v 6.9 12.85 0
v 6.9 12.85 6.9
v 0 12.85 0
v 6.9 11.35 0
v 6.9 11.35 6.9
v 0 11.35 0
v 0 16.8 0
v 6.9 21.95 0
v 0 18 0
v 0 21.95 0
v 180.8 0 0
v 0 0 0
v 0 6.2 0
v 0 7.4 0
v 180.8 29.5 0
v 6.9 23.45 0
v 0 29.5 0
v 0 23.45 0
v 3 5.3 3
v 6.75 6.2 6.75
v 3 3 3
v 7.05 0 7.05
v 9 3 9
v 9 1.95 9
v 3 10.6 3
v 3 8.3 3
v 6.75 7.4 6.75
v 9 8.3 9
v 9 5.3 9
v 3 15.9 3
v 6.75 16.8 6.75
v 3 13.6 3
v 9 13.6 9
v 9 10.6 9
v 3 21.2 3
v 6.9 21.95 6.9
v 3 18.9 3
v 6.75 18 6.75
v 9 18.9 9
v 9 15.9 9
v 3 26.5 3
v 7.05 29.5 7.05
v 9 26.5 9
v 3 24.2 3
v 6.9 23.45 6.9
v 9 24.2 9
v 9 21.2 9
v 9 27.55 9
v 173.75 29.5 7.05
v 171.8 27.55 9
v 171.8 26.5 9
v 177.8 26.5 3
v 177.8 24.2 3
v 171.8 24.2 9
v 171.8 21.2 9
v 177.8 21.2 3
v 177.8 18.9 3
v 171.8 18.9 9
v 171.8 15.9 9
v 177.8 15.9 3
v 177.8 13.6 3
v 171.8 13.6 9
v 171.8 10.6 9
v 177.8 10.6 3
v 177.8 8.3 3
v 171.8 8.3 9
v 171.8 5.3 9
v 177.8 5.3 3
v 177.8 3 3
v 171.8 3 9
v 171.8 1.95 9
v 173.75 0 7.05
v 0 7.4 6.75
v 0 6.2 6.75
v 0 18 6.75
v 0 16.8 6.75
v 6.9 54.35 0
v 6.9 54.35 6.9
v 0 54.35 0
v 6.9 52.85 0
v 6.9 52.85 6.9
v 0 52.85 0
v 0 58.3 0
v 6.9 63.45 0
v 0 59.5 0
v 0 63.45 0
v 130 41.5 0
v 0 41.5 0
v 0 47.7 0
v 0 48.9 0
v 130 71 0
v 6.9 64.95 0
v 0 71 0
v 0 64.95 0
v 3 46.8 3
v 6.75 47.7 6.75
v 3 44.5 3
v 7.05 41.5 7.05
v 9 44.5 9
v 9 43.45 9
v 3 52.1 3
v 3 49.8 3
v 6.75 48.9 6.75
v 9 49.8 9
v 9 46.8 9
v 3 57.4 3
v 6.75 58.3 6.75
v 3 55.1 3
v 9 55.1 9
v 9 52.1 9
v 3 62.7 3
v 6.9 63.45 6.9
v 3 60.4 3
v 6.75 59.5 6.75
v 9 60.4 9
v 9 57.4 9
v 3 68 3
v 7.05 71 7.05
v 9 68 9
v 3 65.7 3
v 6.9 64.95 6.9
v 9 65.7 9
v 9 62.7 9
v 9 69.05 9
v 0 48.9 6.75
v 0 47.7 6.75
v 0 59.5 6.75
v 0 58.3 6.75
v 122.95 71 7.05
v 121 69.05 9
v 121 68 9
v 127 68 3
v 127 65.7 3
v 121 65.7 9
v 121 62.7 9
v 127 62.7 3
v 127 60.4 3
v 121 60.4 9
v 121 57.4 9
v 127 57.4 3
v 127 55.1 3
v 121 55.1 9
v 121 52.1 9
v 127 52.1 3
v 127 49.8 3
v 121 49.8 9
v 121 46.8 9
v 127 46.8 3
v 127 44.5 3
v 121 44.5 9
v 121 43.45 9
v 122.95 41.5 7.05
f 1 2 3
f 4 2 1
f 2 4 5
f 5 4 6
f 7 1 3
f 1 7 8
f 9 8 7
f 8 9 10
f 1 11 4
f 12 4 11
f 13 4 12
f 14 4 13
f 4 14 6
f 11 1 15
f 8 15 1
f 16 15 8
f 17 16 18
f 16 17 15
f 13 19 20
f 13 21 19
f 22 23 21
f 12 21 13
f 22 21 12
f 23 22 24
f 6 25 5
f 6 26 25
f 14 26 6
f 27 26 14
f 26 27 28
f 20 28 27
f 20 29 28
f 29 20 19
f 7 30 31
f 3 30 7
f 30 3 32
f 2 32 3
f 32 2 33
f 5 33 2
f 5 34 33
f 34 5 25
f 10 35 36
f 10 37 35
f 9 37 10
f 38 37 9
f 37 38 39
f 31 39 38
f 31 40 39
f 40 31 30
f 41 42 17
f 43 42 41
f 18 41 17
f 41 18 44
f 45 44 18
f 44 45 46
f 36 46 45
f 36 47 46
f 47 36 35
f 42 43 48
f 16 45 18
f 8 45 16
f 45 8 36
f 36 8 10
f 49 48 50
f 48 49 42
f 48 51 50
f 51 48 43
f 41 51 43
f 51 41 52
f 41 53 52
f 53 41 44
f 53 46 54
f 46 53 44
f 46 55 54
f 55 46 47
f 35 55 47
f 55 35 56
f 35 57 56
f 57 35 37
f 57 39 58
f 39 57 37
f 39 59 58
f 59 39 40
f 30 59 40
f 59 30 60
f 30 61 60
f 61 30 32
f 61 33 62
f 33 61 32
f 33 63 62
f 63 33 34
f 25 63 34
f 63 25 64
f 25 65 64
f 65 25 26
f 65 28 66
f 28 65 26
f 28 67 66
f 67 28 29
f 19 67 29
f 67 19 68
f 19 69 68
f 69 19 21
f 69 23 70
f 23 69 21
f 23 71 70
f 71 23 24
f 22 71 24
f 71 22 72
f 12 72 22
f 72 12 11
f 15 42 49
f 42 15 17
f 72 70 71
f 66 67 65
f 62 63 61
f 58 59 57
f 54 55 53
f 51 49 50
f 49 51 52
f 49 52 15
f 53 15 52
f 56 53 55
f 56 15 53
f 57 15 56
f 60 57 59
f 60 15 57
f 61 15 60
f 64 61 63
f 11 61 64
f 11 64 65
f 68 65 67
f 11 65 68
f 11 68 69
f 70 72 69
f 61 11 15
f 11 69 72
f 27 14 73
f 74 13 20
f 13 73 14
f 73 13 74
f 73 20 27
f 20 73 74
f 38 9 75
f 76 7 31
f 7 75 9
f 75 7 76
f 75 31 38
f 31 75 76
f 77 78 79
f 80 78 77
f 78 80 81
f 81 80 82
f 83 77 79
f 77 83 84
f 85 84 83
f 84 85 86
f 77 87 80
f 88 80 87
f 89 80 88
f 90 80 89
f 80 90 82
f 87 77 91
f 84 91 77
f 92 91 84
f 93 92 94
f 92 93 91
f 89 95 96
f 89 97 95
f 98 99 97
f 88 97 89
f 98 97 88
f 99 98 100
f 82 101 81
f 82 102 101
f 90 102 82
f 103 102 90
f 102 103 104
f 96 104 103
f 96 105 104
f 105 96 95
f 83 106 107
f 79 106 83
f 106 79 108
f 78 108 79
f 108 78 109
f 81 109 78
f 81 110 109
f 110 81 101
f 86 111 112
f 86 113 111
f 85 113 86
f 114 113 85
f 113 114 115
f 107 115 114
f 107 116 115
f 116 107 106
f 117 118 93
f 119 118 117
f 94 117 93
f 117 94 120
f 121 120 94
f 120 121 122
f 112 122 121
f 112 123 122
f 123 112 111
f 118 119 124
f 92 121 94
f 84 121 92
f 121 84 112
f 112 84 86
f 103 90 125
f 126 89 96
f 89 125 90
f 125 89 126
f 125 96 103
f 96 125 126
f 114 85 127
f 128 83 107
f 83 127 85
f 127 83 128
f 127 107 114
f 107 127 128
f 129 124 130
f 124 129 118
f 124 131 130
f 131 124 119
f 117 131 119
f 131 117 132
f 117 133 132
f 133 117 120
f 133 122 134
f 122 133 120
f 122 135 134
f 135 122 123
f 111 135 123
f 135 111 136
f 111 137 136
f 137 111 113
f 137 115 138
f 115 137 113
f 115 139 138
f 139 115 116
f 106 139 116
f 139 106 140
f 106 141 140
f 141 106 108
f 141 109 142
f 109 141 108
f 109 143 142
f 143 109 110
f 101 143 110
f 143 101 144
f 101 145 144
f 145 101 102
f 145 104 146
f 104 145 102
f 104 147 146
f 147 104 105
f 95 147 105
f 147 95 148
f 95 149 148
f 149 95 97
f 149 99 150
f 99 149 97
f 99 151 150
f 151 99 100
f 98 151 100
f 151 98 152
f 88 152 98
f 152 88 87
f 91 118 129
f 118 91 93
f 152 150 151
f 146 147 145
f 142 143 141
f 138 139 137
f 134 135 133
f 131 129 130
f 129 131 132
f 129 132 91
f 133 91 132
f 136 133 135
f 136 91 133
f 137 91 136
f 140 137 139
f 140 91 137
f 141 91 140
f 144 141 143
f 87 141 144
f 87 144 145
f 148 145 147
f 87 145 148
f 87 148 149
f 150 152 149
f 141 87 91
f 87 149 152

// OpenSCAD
// Acrylic Panel Frame Builder
// Parametric 2-sided (L) or 4-sided multi-panel acrylic frame with
// 45° mitered ends and interior tongue/groove interlocks.
// Units: millimeters

/* [Frame Style] */
// 2 = L-shaped stand; 4 = closed picture frame
num_sides = 2; // [2, 4]
// Chamfer the long outer top edges of the profile
bevel_outer = true;
// assembled = visual check; printable = parts laid flat for export
layout = "printable"; // ["assembled", "printable"]
// Ghost acrylic panels in assembled view
show_panels = true;
// 2-sided free-end styles (non-joining ends):
//   mitered = 45° cut; open = square, slots through; closed = square with end wall
// Length rail = bottom / horizontal (along panel_length)
length_end_style = "mitered"; // ["mitered", "open", "closed"]
// Width rail = side / vertical (along panel_width)
width_end_style = "mitered"; // ["mitered", "open", "closed"]

/* [Panels] */
num_panels = 5;
// Acrylic edge along the bottom / horizontal rails (7" default)
panel_length = 177.8;
// Acrylic edge along the side / vertical rails (5" default)
panel_width = 127;
// Acrylic stock thickness
panel_thickness = 2;

/* [Slots & Frame Body] */
// How far the acrylic sits into each groove
slot_depth = 6;
// Extra clearance added to slot opening width
slot_tolerance = 0.3;
// Solid wall between neighboring panel slots
gap_between_panels = 3;
// Solid material under the slot floor
frame_under_slot = 3;
// Material outside the first and last slot
outer_wall = 3;
// Long-edge outer chamfer size when bevel_outer is true
bevel_size = 2;

/* [Corner Joint] */
// Clearance on interior tongues / grooves (per side, and on top)
joint_tolerance = 0.15;
// Fraction of the 45° face used by tongues/slots, measured from the base
interlock_face_fraction = 0.75;
// Tongue/groove thickness inside the wall (stack direction); 0 = auto
tab_thickness = 0;

/* [Print Layout] */
print_spacing = 12;

/* [Hidden] */
eps = 0.05;

// ---------------------------------------------------------------------------
// Derived
// ---------------------------------------------------------------------------
slot_opening = panel_thickness + slot_tolerance;
frame_height = slot_depth + frame_under_slot;
frame_width  = 2 * outer_wall
             + num_panels * slot_opening
             + max(0, num_panels - 1) * gap_between_panels;
wall_count   = num_panels + 1;
interior_wall_count = max(0, wall_count - 2);

// Thin tongue inside the wall — leaves wall material on both sides
tab_t_raw = tab_thickness > 0 ? tab_thickness : min(1.2, gap_between_panels / 2);
// Tongue/slot height along the miter (from the base); top of face left clear for tolerance.
// Cap so interlock_h + joint_tolerance never exceeds frame height.
interlock_h_max = frame_under_slot + slot_depth - joint_tolerance;
interlock_h = min(frame_height * interlock_face_fraction, interlock_h_max);

// Outer pad = material under the slot floor, so acrylic sits inset from
// the outside of the frame (not flush with the outer corner).
// 2-sided: pad only at the joining corner; free ends stay flush with the panel.
// 4-sided: pad on both ends of each rail.
outer_pad       = frame_under_slot;
rail_pad_count  = num_sides == 2 ? 1 : 2;
// Closed free ends add an outer_wall-thick cap beyond the panel
length_end_cap  = (num_sides == 2 && length_end_style == "closed") ? outer_wall : 0;
width_end_cap   = (num_sides == 2 && width_end_style  == "closed") ? outer_wall : 0;
bottom_rail_len = panel_length + rail_pad_count * outer_pad + length_end_cap;
side_rail_len   = panel_width  + rail_pad_count * outer_pad + width_end_cap;

length_end_mitered = (length_end_style == "mitered");
length_end_closed  = (length_end_style == "closed");
width_end_mitered  = (width_end_style  == "mitered");
width_end_closed   = (width_end_style  == "closed");

// Tongue/groove gender along the stack.
// Even # of interior walls (odd panel count): reversing the stack (flip when
// assembling from the print bed) swaps phase 0 ↔ phase 1. Mating parts must
// use the SAME phase so a flipped piece becomes complementary.
// Odd # of interior walls (even panel count): reverse preserves phase, so
// mating parts use opposite phases.
flip_mates = (interior_wall_count % 2 == 0);
function mate_phase(phase) = flip_mates ? phase : (1 - phase);

// ---------------------------------------------------------------------------
function wall_y(i) =
    (i == 0) ? 0
             : outer_wall + i * slot_opening + (i - 1) * gap_between_panels;

function wall_thickness(i) =
    (i == 0 || i == wall_count - 1) ? outer_wall : gap_between_panels;

function slot_y(i) =
    outer_wall + i * (slot_opening + gap_between_panels);

function interior_wall_id(k) = k + 1;

// Tongue thickness clamped so it fits inside a given wall
function tongue_t(i) =
    min(tab_t_raw, max(0.6, wall_thickness(i) - 1.0));

// Centered Y origin of the tongue/groove inside wall i
function tongue_y(i) =
    wall_y(i) + (wall_thickness(i) - tongue_t(i)) / 2;

// ---------------------------------------------------------------------------
// 2D profile: X = stack, Y = height (slots open +Y)
// ---------------------------------------------------------------------------
module frame_profile(bevel = false) {
    difference() {
        square([frame_width, frame_height]);

        for (i = [0 : num_panels - 1])
            translate([slot_y(i), frame_under_slot])
                square([slot_opening, slot_depth + eps]);

        if (bevel && bevel_size > 0) {
            polygon([
                [-eps, frame_height - bevel_size],
                [-eps, frame_height + eps],
                [bevel_size, frame_height + eps]
            ]);
            polygon([
                [frame_width + eps, frame_height - bevel_size],
                [frame_width - bevel_size, frame_height + eps],
                [frame_width + eps, frame_height + eps]
            ]);
        }
    }
}

// Rail along +X: X=length, Y=stack, Z=base→slots
module slotted_bar(length, bevel = false) {
    rotate([90, 0, 90])
        linear_extrude(height = length, convexity = 10)
            frame_profile(bevel);
}

// ---------------------------------------------------------------------------
// Clean 45° outside miter — whole profile, including all walls & base.
// Removes x < z at the start (base / outer corner is the long point).
// ---------------------------------------------------------------------------
module miter_waste_start() {
    translate([0, frame_width + eps, 0])
        rotate([90, 0, 0])
            linear_extrude(height = frame_width + 2 * eps, convexity = 4)
                polygon([
                    [-eps,               -eps],
                    [-eps,               frame_height + eps],
                    [frame_height + eps, frame_height + eps]
                ]);
}

module miter_waste_end(length) {
    translate([length, 0, 0])
        mirror([1, 0, 0])
            miter_waste_start();
}

// ---------------------------------------------------------------------------
// Triangular tongue / groove in the XZ plane (thin in Y).
//
// Male tongue = right triangle in the miter WASTE region (x <= z):
//   (0,0) — (0,fh) — (fh,fh). Hypotenuse lies on the 45° face; the tongue
//   merges with the base at the outer corner. Height == frame_height.
//
// Female groove = thin parallelogram pocket ALONG the 45° face, cut into
//   the solid (x >= z) by `deepen`. Opens on the miter face for the full
//   face length (base → tip) so the mate's triangular tongue can insert.
//   Previous vertical-rectangle cuts at the tip were wrong (invisible /
//   "blemishes" in print mode, oversized slots when assembled).
// ---------------------------------------------------------------------------
module tongue_triangle_2d() {
    // Waste-side triangle on the lower portion of the miter face only.
    // Hypotenuse lies on the 45° face from the base up to interlock_h.
    h = interlock_h;
    polygon([
        [0, 0],
        [0, h],
        [h, h]
    ]);
}

module groove_triangle_2d() {
    // Solid-side triangle matching the tongue, with joint_tolerance on the
    // sides and top. Bottom stays at z = 0 (no cut into the build-plate
    // base). Top tolerance uses the unused upper quarter of the miter face
    // so it does not run past the top of the rail.
    t = joint_tolerance;
    h = interlock_h;
    top = min(h + t, frame_height);
    polygon([
        [0,     0],
        [h + t, 0],
        [h + t, top]
    ]);
}

module thin_prism_xy(y, thickness) {
    // Extrude a 2D XZ profile (drawn in XY) into a thin prism along Y
    translate([0, y + thickness, 0])
        rotate([90, 0, 0])
            linear_extrude(height = thickness, convexity = 4)
                children();
}

module interior_tongues(at_start = true, length = 0, phase = 0) {
    if (interior_wall_count > 0)
        for (k = [0 : interior_wall_count - 1])
            if (k % 2 == phase) {
                i = interior_wall_id(k);
                y = tongue_y(i);
                t = tongue_t(i);
                if (at_start)
                    thin_prism_xy(y, t)
                        tongue_triangle_2d();
                else
                    translate([length, 0, 0])
                        mirror([1, 0, 0])
                            thin_prism_xy(y, t)
                                tongue_triangle_2d();
            }
}

module interior_grooves(at_start = true, length = 0, phase = 0) {
    if (interior_wall_count > 0)
        for (k = [0 : interior_wall_count - 1])
            if (k % 2 != phase) {
                i = interior_wall_id(k);
                // Lateral clearance: same joint_tolerance used on the top
                t = tongue_t(i) + 2 * joint_tolerance;
                y = wall_y(i) + (wall_thickness(i) - t) / 2;
                if (at_start)
                    thin_prism_xy(y, t)
                        groove_triangle_2d();
                else
                    translate([length, 0, 0])
                        mirror([1, 0, 0])
                            thin_prism_xy(y, t)
                                groove_triangle_2d();
            }
}

// Cap that closes panel slots at a square free end (thickness = outer_wall).
// Uses the same outer-edge bevel as the rail profile when requested.
module end_cap(length, bevel = false) {
    translate([length - outer_wall, 0, 0])
        rotate([90, 0, 90])
            linear_extrude(height = outer_wall, convexity = 4)
                difference() {
                    square([frame_width, frame_height]);
                    if (bevel && bevel_size > 0) {
                        polygon([
                            [-eps, frame_height - bevel_size],
                            [-eps, frame_height + eps],
                            [bevel_size, frame_height + eps]
                        ]);
                        polygon([
                            [frame_width + eps, frame_height - bevel_size],
                            [frame_width - bevel_size, frame_height + eps],
                            [frame_width + eps, frame_height + eps]
                        ]);
                    }
                }
}

// ---------------------------------------------------------------------------
// One rail
//   miter_*      : apply clean 45° end cut
//   interlock_*  : add interior tongue/groove (joining ends only)
//   closed_end   : square free end with outer_wall-thick slot cap
// ---------------------------------------------------------------------------
module frame_rail(
    length,
    miter_start = false,
    miter_end = false,
    interlock_start = false,
    interlock_end = false,
    phase_start = 0,
    phase_end = 0,
    bevel = false,
    closed_end = false
) {
    union() {
        difference() {
            slotted_bar(length, bevel);

            if (miter_start)
                miter_waste_start();
            if (miter_end)
                miter_waste_end(length);

            // Grooves cut after miter so they go through the angled face
            // and all the way down through the base.
            if (miter_start && interlock_start)
                interior_grooves(true, length, phase_start);
            if (miter_end && interlock_end)
                interior_grooves(false, length, phase_end);
        }

        // Tongues unioned after miter so they stay un-chamfered, full-height,
        // and merged with the base.
        if (miter_start && interlock_start)
            interior_tongues(true, length, phase_start);
        if (miter_end && interlock_end)
            interior_tongues(false, length, phase_end);

        // Closed free end: solid wall capping the slots
        if (closed_end)
            end_cap(length, bevel);
    }
}

module orient_rail_vertical() {
    multmatrix([
        [0, 0, 1, 0],
        [0, 1, 0, 0],
        [1, 0, 0, 0],
        [0, 0, 0, 1]
    ]) children();
}

// Reverse the panel-stack axis (as when flipping a printed part to stand it up).
module flip_stack() {
    translate([0, frame_width, 0])
        mirror([0, 1, 0])
            children();
}

module acrylic_panels() {
    // Inset by frame_under_slot so edges sit on the slot floors
    color([0.55, 0.8, 1.0, 0.35])
        for (i = [0 : num_panels - 1])
            translate([
                outer_pad,
                slot_y(i) + slot_tolerance / 2,
                outer_pad
            ])
                cube([panel_length, panel_thickness, panel_width]);
}

// ---------------------------------------------------------------------------
// 2-sided: joining end = miter + interlock; free ends per length/width style
// ---------------------------------------------------------------------------
module assembled_2() {
    side_phase = mate_phase(0);

    color("SteelBlue")
        frame_rail(
            bottom_rail_len,
            miter_start = true,
            miter_end = length_end_mitered,
            interlock_start = true,
            interlock_end = false,
            phase_start = 0,
            bevel = bevel_outer,
            closed_end = length_end_closed
        );

    color("CadetBlue")
        orient_rail_vertical()
            // When flip_mates, mirror stack to match flipping the printed side rail
            if (flip_mates)
                flip_stack()
                    frame_rail(
                        side_rail_len,
                        miter_start = true,
                        miter_end = width_end_mitered,
                        interlock_start = true,
                        interlock_end = false,
                        phase_start = side_phase,
                        bevel = bevel_outer,
                        closed_end = width_end_closed
                    );
            else
                frame_rail(
                    side_rail_len,
                    miter_start = true,
                    miter_end = width_end_mitered,
                    interlock_start = true,
                    interlock_end = false,
                    phase_start = side_phase,
                    bevel = bevel_outer,
                    closed_end = width_end_closed
                );

    if (show_panels)
        acrylic_panels();
}

module assembled_4() {
    // Length rails: mirrored ends (0 at start/left, 1 at end/right) so a
    // length can be flipped end-for-end and still match the width pair.
    // Width rails: same order on both ends — pairing combo:
    //   left  = phase 1 (mates length's phase-0 ends)
    //   right = phase 0 (mates length's phase-1 ends)
    Lh = bottom_rail_len;
    Lv = side_rail_len;

    // Bottom: start at left (phase 0), end at right (phase 1)
    color("SteelBlue")
        frame_rail(Lh, true, true, true, true, 0, 1, bevel_outer);

    // Right: phase 0 both ends — mates length phase-1 ends
    color("CadetBlue")
        translate([Lh, 0, 0])
            mirror([1, 0, 0])
                orient_rail_vertical()
                    frame_rail(Lv, true, true, true, true, 0, 0, bevel_outer);

    // Top: keep start at world-left (phase 0) and end at world-right (phase 1),
    // slots facing inward (-Z)
    color("SteelBlue")
        translate([0, 0, Lv])
            mirror([1, 0, 0])
                rotate([0, 180, 0])
                    frame_rail(Lh, true, true, true, true, 0, 1, bevel_outer);

    // Left: phase 1 both ends — mates length phase-0 ends
    color("CadetBlue")
        translate([0, 0, Lv])
            mirror([0, 0, 1])
                orient_rail_vertical()
                    frame_rail(Lv, true, true, true, true, 1, 1, bevel_outer);

    if (show_panels)
        acrylic_panels();
}

module printable_parts() {
    if (num_sides == 2) {
        // Side phase: same as bottom when flip_mates (odd panel count),
        // opposite otherwise — flip one part when standing it up.
        side_phase = mate_phase(0);
        frame_rail(
            bottom_rail_len,
            miter_start = true,
            miter_end = length_end_mitered,
            interlock_start = true,
            interlock_end = false,
            phase_start = 0,
            bevel = bevel_outer,
            closed_end = length_end_closed
        );
        translate([0, frame_width + print_spacing, 0])
            frame_rail(
                side_rail_len,
                miter_start = true,
                miter_end = width_end_mitered,
                interlock_start = true,
                interlock_end = false,
                phase_start = side_phase,
                bevel = bevel_outer,
                closed_end = width_end_closed
            );
    } else {
        // 2× length: mirrored ends (0 / 1) — flippable either direction
        // 1× width phase 1/1 (pairs with length phase-0 ends)
        // 1× width phase 0/0 (pairs with length phase-1 ends)
        frame_rail(bottom_rail_len, true, true, true, true, 0, 1, bevel_outer);
        translate([0, 1 * (frame_width + print_spacing), 0])
            frame_rail(bottom_rail_len, true, true, true, true, 0, 1, bevel_outer);
        translate([0, 2 * (frame_width + print_spacing), 0])
            frame_rail(side_rail_len, true, true, true, true, 1, 1, bevel_outer);
        translate([0, 3 * (frame_width + print_spacing), 0])
            frame_rail(side_rail_len, true, true, true, true, 0, 0, bevel_outer);
    }
}

// ---------------------------------------------------------------------------
echo(str("num_sides = ", num_sides));
echo(str("slot_opening = ", slot_opening));
echo(str("frame_width (stack) = ", frame_width));
echo(str("frame_height = ", frame_height));
echo(str("bottom/horizontal rail length = ", bottom_rail_len));
echo(str("side/vertical rail length = ", side_rail_len));
echo(str("tab_t (nominal) = ", tab_t_raw));
echo(str("interlock_h = ", interlock_h));
echo(str("interior_walls = ", interior_wall_count));
echo(str("flip_mates (same print phase) = ", flip_mates));
echo(str("length_end_style = ", length_end_style));
echo(str("width_end_style = ", width_end_style));

if (layout == "printable")
    printable_parts();
else if (num_sides == 2)
    assembled_2();
else
    assembled_4();
